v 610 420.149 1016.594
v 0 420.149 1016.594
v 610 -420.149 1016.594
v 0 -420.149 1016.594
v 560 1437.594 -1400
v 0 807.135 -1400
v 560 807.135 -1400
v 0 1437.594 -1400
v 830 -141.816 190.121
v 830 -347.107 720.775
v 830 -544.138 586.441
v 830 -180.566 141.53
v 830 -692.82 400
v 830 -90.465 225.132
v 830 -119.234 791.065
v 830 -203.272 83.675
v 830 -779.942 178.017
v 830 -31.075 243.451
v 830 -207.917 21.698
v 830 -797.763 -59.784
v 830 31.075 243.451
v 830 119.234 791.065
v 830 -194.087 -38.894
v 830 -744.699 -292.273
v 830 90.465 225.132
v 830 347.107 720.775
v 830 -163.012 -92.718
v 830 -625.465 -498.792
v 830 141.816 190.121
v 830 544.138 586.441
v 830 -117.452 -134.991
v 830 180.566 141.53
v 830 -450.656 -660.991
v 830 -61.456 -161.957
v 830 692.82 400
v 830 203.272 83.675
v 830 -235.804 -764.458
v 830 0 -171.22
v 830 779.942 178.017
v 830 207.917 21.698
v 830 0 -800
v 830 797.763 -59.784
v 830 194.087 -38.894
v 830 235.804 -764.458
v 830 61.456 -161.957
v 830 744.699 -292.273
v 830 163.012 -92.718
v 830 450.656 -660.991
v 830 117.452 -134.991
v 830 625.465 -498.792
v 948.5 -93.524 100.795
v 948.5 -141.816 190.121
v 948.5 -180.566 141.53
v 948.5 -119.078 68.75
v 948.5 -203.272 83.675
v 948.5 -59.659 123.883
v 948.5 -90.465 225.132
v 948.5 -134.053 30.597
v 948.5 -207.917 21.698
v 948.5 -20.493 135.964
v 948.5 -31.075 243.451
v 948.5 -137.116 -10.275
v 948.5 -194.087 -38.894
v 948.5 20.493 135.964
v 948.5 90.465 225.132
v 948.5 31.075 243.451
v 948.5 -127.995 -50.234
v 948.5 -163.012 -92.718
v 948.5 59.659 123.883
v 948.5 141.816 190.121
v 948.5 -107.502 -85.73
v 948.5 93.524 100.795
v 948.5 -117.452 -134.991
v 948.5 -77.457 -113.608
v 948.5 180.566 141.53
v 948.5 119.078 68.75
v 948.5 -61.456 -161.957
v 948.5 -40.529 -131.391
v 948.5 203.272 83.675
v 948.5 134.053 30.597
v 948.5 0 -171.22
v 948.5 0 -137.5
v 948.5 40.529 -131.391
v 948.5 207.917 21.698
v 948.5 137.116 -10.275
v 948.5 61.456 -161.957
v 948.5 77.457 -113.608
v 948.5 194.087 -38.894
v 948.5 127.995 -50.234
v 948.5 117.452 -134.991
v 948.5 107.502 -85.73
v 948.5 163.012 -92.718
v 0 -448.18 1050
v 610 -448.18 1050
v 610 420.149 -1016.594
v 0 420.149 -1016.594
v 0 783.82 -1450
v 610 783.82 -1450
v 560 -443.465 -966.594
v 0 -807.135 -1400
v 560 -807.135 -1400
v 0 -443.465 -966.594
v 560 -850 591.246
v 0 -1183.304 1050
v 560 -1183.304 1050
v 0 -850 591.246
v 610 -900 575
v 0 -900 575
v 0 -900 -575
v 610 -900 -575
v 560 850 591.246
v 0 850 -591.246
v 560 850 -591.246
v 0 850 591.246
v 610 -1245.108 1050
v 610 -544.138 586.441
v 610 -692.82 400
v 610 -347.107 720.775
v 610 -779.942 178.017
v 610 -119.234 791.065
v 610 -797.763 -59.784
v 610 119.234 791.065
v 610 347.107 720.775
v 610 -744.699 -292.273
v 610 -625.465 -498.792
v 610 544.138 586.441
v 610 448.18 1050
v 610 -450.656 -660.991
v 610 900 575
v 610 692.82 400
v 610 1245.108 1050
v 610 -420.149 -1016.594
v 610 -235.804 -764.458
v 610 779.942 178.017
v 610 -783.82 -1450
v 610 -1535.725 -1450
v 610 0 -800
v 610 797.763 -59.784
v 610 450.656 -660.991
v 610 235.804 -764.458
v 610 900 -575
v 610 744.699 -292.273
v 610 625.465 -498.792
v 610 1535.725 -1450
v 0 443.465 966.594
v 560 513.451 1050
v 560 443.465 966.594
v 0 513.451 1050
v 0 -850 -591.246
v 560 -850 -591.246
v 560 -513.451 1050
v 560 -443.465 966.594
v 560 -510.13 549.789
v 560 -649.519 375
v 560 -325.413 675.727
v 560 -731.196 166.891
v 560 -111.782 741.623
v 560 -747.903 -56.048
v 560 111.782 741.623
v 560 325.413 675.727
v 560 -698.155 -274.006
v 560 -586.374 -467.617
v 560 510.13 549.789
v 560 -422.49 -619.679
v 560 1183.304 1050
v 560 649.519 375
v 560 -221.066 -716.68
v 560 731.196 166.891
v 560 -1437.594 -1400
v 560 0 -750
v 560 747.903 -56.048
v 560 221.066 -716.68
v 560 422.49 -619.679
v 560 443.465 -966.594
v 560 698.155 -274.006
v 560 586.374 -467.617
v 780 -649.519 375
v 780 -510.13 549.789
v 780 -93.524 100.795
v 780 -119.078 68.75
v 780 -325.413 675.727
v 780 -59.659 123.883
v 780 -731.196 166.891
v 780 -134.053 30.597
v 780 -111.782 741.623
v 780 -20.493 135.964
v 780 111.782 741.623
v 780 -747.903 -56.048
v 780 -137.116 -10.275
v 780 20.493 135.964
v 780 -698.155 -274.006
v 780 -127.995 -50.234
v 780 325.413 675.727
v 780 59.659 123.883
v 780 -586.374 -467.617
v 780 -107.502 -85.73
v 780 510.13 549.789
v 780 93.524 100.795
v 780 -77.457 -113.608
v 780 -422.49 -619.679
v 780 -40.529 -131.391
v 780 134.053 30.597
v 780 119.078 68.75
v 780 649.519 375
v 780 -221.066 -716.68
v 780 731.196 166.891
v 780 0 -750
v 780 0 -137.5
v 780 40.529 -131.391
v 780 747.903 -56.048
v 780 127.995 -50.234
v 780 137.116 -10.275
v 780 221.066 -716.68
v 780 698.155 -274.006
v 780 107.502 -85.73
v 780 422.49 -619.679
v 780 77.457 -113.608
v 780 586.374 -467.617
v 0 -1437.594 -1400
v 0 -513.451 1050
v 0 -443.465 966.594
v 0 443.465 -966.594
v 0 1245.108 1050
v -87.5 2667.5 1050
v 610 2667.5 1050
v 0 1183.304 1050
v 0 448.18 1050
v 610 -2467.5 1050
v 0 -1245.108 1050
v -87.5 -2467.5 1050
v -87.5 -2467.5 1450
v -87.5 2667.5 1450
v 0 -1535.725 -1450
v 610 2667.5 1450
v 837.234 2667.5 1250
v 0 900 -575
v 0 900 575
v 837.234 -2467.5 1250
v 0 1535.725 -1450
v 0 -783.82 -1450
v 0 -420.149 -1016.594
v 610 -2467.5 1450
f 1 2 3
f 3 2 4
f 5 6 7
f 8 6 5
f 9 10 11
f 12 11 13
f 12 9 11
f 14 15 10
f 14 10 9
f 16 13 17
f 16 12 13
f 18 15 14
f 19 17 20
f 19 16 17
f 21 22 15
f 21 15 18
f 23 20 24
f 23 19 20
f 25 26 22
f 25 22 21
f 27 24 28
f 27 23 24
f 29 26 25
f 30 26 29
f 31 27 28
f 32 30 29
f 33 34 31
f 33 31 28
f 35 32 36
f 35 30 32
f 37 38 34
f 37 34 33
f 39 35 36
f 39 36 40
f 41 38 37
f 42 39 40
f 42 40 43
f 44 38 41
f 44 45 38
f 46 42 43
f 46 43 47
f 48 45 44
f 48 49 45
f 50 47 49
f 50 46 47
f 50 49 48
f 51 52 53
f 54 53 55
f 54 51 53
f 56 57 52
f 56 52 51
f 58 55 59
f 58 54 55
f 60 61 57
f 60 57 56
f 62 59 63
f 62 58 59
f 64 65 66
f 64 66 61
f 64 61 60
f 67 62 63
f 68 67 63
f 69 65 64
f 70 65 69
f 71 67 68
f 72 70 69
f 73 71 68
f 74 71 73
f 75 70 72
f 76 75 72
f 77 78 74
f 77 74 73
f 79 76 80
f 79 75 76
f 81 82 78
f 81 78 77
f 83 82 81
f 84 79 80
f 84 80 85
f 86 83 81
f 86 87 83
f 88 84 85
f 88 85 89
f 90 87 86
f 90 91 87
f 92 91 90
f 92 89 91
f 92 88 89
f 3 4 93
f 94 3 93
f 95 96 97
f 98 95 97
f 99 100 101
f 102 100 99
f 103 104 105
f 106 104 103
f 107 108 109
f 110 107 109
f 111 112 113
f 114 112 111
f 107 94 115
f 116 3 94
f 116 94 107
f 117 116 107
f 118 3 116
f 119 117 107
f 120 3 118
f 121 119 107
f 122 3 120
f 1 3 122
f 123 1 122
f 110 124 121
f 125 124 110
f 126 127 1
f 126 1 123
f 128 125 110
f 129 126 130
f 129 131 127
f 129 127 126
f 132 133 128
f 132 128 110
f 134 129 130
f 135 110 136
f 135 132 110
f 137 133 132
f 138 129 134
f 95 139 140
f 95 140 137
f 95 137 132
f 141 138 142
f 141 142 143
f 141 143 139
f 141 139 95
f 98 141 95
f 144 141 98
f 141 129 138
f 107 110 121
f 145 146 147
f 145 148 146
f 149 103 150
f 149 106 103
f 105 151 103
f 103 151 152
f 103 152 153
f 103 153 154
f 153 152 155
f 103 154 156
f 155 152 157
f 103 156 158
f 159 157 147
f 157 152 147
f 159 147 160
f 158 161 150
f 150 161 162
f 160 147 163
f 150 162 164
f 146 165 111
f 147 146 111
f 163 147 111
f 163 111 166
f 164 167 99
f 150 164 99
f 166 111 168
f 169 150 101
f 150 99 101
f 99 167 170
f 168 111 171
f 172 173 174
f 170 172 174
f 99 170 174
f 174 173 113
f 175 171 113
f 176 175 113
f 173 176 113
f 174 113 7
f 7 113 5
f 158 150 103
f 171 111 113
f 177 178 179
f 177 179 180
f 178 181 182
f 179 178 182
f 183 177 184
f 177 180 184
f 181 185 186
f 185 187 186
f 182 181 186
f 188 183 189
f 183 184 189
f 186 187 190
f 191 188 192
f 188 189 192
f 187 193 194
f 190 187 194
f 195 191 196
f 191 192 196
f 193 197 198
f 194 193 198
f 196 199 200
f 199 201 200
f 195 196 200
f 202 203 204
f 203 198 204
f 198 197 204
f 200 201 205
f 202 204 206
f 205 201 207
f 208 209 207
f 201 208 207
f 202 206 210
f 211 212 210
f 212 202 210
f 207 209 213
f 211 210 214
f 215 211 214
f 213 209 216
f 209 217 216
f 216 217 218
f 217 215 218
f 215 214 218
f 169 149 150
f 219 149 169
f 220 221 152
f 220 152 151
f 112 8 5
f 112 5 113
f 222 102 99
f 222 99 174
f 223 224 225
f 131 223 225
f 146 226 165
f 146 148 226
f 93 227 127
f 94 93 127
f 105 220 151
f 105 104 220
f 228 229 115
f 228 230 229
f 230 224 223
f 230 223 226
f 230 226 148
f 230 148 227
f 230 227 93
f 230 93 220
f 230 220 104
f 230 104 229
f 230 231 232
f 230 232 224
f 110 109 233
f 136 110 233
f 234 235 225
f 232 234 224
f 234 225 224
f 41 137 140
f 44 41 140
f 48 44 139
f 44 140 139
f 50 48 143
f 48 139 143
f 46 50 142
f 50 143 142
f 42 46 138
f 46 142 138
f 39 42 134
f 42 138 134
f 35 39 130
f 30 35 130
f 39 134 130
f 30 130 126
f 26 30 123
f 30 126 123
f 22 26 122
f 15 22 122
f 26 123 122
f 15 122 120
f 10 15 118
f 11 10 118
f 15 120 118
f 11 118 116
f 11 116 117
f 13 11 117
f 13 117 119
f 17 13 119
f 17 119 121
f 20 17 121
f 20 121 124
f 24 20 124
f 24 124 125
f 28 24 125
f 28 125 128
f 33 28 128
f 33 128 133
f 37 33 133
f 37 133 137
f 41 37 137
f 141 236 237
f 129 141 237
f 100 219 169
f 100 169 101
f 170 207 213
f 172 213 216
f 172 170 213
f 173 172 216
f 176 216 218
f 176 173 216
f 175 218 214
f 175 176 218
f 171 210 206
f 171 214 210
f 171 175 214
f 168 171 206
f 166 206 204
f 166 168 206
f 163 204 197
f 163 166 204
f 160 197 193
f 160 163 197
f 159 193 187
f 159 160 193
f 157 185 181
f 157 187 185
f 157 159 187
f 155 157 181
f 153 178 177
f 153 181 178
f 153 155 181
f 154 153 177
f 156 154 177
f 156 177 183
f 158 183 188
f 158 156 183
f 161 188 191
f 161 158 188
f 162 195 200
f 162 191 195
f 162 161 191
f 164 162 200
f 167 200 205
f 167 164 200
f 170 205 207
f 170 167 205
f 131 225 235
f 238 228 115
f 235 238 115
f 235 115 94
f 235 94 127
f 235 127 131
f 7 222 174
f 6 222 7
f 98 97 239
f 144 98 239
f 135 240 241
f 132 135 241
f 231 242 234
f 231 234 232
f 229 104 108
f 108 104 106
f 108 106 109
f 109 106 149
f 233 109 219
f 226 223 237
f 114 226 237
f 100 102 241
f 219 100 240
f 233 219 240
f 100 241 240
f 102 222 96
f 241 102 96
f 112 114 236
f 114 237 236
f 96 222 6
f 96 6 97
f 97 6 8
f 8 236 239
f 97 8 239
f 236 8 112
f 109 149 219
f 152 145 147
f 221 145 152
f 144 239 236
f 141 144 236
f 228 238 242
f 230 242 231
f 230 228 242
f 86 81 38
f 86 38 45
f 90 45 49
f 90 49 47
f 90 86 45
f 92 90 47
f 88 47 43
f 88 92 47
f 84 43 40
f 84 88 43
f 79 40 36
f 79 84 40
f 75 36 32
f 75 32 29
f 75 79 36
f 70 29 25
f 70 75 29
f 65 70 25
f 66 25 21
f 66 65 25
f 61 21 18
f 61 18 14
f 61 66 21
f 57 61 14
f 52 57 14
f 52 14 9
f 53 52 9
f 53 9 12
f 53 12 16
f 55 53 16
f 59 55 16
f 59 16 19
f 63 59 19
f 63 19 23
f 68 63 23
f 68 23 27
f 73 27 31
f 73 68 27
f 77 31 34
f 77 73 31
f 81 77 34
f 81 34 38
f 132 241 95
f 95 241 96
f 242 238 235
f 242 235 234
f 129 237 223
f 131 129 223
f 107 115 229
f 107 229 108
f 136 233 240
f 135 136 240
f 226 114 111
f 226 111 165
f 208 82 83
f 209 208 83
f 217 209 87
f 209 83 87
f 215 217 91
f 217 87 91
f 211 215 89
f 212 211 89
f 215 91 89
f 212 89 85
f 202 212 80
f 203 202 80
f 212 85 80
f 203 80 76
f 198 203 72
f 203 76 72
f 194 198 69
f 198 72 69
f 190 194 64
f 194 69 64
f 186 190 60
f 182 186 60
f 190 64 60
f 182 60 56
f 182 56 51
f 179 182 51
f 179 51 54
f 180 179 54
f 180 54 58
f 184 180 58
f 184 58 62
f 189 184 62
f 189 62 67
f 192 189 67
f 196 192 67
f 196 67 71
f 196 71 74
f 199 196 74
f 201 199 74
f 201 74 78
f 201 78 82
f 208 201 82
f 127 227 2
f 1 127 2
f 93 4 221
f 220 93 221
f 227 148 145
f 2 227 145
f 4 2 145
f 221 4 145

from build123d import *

# Parameters (mm, degrees)
BOSS_EXTRUDE1_DEPTH      = 610
SKETCH5_R                = 800
BOSS_EXTRUDE2_DEPTH      = 830
SHELL1_T                 = -50
SKETCH6_R                = 137.5
CUT_EXTRUDE6_DEPTH       = 830
BOSS_EXTRUDE3_START      = 118.5
SKETCH7_R                = 208.5
SKETCH7_R_2              = 137.5
BOSS_EXTRUDE3_DEPTH      = 118.5
BOSS_EXTRUDE5_DEPTH      = 2667.5
BOSS_EXTRUDE5_DEPTH_BACK = 2467.5


with BuildPart() as part:
    # Sketch1 → Boss-Extrude1 (new body)
    with BuildSketch(Plane(origin=(0, 0, 0), x_dir=(0, 0, -1), z_dir=(1, 0, 0))):
        Polygon((575, 900), (-575, 900), (-1450, 1535.724712005), (-1450, 783.82001496), (-1016.594085516, 420.149271967), (-1016.594085516, -420.149271967), (-1450, -783.82001496), (-1450, -1535.724712005), (-575, -900), (575, -900), (1450, -1535.724712005), (1450, -783.82001496), (1016.594085516, -420.149271967), (1016.594085516, 420.149271967), (1450, 783.82001496), (1450, 1535.724712005), align=None)
    extrude(amount=BOSS_EXTRUDE1_DEPTH)

    # Sketch5 → Boss-Extrude2 (add)
    with BuildSketch(Plane(origin=(0, 0, 0), x_dir=(0, 0, -1), z_dir=(1, 0, 0))):
        Circle(SKETCH5_R)
    extrude(amount=BOSS_EXTRUDE2_DEPTH)

    # Shell1
    shell1_openings = [part.faces().sort_by_distance(p)[0] for p in [
        (0, 0, 0),
    ]]
    offset(amount=SHELL1_T, openings=shell1_openings, kind=Kind.INTERSECTION)

    # Sketch6 → Cut-Extrude6 (cut)
    with BuildSketch(Plane(origin=(830, 0, 0), x_dir=(0, 0, -1), z_dir=(1, 0, 0))):
        Circle(SKETCH6_R)
    extrude(amount=-CUT_EXTRUDE6_DEPTH, mode=Mode.SUBTRACT)

    # Sketch7 → Boss-Extrude3 (add)
    with BuildSketch(Plane(origin=(830, 0, 0), x_dir=(0, 0, -1), z_dir=(1, 0, 0)).offset(BOSS_EXTRUDE3_START)):
        with Locations((-37.279706597, 0)):
            Circle(SKETCH7_R)
        Circle(SKETCH7_R_2, mode=Mode.SUBTRACT)
    extrude(amount=-BOSS_EXTRUDE3_DEPTH)

    # Sketch8 → Boss-Extrude5 (add, two sides: drawn at the far end of the back side and taken through both)
    with BuildSketch(Plane(origin=(0, 0, 0), x_dir=(1, 0, 0), z_dir=(0, 1, 0)).offset(-BOSS_EXTRUDE5_DEPTH_BACK)):
        Polygon((837.233623205, -1250), (610, -1450), (-87.5, -1450), (-87.5, -1050), (610, -1050), align=None)
    extrude(amount=BOSS_EXTRUDE5_DEPTH + BOSS_EXTRUDE5_DEPTH_BACK)


solid = part.part
